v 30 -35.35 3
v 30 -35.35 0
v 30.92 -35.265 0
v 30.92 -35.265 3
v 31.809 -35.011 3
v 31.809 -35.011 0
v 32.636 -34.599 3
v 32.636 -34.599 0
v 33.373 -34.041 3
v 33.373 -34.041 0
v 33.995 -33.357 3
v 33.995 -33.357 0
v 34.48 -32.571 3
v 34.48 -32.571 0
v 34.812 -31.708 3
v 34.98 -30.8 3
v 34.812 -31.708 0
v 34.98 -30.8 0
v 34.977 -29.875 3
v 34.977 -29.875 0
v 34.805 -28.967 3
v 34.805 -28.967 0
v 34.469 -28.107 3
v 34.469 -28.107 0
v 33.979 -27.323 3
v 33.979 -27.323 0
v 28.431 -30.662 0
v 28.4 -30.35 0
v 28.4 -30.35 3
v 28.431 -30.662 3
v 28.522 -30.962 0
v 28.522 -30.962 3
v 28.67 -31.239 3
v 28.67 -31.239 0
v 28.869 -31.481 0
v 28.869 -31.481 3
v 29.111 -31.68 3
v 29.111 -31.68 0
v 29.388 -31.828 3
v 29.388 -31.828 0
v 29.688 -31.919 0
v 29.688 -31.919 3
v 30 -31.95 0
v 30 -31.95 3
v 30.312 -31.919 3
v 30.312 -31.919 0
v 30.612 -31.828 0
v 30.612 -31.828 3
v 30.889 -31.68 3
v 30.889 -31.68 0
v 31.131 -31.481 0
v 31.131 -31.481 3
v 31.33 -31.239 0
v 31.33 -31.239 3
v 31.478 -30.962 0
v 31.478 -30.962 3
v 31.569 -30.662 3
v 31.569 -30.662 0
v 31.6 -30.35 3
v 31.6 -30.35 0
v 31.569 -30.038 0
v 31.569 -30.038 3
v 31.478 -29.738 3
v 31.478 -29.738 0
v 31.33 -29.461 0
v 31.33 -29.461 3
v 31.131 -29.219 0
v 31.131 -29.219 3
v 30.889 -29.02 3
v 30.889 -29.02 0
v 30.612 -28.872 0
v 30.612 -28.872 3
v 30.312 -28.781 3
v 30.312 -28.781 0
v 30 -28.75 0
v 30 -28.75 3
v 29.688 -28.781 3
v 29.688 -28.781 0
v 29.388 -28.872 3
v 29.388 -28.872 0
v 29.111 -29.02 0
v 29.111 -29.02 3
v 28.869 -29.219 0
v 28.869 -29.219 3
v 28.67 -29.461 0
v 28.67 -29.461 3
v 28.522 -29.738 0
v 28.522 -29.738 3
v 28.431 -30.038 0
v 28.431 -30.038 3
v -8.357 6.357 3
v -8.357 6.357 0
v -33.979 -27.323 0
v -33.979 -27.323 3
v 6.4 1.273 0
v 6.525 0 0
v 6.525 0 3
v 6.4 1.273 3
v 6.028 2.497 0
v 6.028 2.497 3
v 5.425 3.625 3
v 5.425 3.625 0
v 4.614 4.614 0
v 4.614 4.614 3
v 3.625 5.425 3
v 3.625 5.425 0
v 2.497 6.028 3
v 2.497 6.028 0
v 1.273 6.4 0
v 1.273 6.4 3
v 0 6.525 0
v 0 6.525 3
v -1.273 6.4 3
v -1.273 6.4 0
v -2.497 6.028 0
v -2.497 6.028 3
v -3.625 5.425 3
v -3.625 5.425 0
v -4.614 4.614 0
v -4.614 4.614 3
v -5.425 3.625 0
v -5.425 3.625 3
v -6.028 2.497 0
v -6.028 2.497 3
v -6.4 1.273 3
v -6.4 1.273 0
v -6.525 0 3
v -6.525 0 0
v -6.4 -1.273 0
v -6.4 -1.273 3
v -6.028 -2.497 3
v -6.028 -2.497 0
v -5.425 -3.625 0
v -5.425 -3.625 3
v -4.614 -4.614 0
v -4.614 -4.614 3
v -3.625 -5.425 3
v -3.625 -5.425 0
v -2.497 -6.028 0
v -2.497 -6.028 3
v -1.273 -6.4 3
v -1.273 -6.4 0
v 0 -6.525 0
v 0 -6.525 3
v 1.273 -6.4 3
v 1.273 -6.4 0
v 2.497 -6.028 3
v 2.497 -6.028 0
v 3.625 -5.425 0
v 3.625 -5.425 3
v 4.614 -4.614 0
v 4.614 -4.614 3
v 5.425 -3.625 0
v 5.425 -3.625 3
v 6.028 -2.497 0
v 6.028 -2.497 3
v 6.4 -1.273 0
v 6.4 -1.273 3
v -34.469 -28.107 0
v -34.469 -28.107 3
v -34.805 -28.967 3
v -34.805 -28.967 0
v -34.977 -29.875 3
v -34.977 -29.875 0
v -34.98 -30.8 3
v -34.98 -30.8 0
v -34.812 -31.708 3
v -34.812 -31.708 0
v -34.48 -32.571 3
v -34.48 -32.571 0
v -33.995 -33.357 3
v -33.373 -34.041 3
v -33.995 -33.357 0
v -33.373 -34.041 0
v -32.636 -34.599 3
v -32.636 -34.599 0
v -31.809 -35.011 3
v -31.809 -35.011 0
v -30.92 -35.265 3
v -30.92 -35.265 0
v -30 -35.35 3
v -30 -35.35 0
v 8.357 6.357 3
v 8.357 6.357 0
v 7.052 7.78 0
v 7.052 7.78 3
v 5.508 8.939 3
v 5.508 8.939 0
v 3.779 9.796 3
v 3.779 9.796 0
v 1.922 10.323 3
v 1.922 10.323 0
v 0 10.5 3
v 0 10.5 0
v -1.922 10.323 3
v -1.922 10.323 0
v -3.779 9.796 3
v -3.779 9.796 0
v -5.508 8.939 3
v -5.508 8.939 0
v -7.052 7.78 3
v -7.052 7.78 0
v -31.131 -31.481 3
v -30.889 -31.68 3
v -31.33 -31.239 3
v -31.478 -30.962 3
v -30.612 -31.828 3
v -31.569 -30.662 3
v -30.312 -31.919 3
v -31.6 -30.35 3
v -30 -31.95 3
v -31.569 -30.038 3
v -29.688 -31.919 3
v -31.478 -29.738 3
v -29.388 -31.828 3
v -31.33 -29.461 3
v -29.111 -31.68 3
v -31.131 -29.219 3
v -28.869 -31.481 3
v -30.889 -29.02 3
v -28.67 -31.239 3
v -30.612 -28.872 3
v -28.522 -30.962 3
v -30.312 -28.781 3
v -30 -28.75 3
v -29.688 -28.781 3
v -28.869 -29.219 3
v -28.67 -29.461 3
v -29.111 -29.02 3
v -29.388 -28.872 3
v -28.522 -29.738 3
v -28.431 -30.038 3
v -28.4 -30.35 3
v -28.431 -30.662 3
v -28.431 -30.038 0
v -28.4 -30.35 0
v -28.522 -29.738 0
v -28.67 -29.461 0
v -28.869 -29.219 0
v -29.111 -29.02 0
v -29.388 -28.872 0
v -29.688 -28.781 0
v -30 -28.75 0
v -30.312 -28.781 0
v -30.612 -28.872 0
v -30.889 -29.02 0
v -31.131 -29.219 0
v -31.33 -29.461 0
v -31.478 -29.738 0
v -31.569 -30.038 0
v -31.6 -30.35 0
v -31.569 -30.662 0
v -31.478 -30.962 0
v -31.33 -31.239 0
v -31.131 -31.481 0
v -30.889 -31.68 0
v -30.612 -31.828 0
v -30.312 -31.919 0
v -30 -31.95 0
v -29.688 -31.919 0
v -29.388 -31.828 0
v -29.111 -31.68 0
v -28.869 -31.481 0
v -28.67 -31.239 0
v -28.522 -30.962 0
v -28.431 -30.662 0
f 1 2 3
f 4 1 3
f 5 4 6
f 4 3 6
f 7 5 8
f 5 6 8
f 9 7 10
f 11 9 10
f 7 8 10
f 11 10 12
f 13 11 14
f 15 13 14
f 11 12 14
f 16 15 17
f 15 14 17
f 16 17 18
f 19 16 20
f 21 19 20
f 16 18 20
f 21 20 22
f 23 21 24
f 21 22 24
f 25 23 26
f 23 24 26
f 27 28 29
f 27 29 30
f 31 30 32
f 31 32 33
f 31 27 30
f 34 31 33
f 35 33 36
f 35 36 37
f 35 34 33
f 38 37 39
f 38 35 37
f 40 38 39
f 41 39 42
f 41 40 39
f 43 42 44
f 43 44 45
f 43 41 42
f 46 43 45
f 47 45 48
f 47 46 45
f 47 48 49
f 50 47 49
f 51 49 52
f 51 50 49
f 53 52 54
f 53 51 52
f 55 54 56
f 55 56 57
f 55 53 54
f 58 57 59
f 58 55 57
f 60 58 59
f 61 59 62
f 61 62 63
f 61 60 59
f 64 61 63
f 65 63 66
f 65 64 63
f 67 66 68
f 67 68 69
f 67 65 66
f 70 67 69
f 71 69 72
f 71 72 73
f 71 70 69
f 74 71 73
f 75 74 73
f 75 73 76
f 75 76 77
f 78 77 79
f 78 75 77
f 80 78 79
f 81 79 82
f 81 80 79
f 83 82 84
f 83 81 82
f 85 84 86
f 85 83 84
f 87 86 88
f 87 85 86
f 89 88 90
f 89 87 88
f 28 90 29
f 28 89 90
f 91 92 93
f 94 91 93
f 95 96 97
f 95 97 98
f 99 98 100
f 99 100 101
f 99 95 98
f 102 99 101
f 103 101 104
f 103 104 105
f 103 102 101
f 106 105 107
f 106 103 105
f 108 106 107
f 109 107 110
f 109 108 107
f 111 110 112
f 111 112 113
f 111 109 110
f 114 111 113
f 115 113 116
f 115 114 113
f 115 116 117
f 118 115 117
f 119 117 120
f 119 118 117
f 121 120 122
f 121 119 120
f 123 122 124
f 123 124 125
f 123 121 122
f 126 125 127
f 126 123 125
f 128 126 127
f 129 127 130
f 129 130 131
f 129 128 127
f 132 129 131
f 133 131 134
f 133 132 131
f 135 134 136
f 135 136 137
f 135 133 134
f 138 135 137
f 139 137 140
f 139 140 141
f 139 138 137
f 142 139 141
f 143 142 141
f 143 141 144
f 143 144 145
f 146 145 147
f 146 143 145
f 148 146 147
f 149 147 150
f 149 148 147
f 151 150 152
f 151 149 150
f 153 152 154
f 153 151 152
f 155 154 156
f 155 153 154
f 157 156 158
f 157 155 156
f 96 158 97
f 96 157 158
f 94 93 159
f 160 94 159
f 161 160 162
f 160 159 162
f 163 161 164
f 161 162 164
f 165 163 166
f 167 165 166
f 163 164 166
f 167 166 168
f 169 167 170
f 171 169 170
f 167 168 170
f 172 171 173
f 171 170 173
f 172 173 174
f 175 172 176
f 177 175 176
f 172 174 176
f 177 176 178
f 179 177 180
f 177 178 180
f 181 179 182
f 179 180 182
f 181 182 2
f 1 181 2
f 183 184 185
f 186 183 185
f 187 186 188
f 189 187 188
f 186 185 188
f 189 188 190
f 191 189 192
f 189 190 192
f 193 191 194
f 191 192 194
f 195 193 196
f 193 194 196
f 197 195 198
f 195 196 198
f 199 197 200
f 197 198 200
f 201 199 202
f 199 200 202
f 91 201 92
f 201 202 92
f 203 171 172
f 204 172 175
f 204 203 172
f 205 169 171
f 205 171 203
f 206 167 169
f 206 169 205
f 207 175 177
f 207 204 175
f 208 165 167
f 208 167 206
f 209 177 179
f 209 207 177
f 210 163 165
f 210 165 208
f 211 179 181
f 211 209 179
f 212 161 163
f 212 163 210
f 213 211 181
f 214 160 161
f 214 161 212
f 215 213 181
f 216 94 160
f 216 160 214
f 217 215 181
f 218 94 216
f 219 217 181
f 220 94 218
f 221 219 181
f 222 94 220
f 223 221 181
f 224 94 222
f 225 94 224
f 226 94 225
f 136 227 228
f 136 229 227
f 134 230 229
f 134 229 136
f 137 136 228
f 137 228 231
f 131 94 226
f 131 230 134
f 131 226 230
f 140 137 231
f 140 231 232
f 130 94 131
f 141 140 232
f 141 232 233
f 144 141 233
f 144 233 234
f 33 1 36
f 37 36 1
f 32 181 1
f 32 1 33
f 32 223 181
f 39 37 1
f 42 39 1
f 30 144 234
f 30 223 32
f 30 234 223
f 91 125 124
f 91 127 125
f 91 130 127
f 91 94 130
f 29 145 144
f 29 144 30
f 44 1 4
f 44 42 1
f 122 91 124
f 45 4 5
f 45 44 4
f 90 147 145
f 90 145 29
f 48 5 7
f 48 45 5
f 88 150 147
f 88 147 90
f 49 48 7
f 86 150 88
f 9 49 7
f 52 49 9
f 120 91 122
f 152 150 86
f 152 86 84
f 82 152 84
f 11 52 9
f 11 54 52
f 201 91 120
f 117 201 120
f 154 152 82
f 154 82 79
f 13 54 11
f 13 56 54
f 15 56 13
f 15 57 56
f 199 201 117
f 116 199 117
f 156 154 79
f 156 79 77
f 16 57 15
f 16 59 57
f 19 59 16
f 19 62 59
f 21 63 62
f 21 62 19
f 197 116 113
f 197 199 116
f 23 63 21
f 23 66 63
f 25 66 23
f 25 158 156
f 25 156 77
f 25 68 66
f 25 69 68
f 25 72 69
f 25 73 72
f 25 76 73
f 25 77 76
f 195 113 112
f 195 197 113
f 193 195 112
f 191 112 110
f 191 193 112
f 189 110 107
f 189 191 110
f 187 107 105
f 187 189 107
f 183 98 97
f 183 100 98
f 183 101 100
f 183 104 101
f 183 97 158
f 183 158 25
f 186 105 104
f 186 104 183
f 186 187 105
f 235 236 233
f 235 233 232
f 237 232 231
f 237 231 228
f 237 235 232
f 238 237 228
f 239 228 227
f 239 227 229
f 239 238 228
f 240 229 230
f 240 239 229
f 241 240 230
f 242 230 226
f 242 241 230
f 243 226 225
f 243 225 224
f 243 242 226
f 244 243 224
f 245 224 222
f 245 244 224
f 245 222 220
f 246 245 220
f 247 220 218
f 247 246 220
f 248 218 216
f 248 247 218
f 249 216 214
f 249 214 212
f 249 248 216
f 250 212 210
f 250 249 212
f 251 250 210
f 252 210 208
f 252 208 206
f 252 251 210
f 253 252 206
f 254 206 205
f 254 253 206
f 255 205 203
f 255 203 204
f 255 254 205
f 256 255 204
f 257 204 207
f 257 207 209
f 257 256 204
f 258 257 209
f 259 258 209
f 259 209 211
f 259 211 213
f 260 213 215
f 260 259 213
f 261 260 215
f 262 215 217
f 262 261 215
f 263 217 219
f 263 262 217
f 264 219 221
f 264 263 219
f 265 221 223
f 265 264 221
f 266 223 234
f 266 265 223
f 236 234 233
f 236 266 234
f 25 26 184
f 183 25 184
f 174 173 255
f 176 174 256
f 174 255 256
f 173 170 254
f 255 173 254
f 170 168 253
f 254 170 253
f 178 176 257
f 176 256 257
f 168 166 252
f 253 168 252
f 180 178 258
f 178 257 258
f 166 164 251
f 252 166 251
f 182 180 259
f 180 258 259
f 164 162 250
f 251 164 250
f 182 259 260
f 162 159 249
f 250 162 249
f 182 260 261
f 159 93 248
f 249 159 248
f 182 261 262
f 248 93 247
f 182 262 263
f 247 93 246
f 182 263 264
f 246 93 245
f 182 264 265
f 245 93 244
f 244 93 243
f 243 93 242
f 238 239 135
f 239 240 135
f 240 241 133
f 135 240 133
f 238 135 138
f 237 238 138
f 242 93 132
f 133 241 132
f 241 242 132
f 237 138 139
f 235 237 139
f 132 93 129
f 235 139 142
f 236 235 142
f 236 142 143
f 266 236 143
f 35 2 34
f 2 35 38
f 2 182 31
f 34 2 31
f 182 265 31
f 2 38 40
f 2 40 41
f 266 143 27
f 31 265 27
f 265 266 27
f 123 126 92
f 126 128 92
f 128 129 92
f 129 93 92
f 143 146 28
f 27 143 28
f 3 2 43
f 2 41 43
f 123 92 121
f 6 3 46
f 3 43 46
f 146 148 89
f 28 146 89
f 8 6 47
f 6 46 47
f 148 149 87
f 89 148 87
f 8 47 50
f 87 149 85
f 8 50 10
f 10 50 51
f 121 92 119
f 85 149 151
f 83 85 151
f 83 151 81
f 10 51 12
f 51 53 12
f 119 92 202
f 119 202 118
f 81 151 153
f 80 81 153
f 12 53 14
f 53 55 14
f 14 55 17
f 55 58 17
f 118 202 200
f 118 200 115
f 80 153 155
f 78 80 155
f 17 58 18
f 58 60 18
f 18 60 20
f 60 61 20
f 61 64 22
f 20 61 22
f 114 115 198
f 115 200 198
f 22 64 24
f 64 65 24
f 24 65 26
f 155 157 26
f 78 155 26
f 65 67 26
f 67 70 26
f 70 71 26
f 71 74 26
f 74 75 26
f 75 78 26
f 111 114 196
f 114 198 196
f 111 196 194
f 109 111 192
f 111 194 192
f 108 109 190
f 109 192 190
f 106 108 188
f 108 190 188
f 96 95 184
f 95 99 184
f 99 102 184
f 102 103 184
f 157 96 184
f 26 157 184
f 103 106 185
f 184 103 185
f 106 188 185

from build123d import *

# Parameters (mm, degrees)
SKETCH_1_R      = 6.525
SKETCH_1_R_2    = 1.6
EXTRUDE_1_DEPTH = 3


with BuildPart() as part:
    # ｽｹｯﾁ1 → ﾎﾞｽ - 押し出し1 (new body)
    with BuildSketch(Plane.XY):
        with BuildLine():
            Line((-8.356610944, 6.357440801), (-33.979338545, -27.322647238))
            ThreePointArc((-33.979338545, -27.322647238), (-34.479774761, -32.570724678), (-30, -35.35))
            Line((-30, -35.35), (30, -35.35))
            ThreePointArc((30, -35.35), (34.479774761, -32.570724678), (33.979338545, -27.322647238))
            Line((33.979338545, -27.322647238), (8.356610944, 6.357440801))
            ThreePointArc((8.356610944, 6.357440801), (0, 10.5), (-8.356610944, 6.357440801))
        make_face()
        Circle(SKETCH_1_R, mode=Mode.SUBTRACT)
        with Locations((-30, -30.35)):
            Circle(SKETCH_1_R_2, mode=Mode.SUBTRACT)
        with Locations(Location((30, -30.35, 0), (0, 0, 180))):
            Circle(SKETCH_1_R_2, mode=Mode.SUBTRACT)
    extrude(amount=EXTRUDE_1_DEPTH)


solid = part.part
